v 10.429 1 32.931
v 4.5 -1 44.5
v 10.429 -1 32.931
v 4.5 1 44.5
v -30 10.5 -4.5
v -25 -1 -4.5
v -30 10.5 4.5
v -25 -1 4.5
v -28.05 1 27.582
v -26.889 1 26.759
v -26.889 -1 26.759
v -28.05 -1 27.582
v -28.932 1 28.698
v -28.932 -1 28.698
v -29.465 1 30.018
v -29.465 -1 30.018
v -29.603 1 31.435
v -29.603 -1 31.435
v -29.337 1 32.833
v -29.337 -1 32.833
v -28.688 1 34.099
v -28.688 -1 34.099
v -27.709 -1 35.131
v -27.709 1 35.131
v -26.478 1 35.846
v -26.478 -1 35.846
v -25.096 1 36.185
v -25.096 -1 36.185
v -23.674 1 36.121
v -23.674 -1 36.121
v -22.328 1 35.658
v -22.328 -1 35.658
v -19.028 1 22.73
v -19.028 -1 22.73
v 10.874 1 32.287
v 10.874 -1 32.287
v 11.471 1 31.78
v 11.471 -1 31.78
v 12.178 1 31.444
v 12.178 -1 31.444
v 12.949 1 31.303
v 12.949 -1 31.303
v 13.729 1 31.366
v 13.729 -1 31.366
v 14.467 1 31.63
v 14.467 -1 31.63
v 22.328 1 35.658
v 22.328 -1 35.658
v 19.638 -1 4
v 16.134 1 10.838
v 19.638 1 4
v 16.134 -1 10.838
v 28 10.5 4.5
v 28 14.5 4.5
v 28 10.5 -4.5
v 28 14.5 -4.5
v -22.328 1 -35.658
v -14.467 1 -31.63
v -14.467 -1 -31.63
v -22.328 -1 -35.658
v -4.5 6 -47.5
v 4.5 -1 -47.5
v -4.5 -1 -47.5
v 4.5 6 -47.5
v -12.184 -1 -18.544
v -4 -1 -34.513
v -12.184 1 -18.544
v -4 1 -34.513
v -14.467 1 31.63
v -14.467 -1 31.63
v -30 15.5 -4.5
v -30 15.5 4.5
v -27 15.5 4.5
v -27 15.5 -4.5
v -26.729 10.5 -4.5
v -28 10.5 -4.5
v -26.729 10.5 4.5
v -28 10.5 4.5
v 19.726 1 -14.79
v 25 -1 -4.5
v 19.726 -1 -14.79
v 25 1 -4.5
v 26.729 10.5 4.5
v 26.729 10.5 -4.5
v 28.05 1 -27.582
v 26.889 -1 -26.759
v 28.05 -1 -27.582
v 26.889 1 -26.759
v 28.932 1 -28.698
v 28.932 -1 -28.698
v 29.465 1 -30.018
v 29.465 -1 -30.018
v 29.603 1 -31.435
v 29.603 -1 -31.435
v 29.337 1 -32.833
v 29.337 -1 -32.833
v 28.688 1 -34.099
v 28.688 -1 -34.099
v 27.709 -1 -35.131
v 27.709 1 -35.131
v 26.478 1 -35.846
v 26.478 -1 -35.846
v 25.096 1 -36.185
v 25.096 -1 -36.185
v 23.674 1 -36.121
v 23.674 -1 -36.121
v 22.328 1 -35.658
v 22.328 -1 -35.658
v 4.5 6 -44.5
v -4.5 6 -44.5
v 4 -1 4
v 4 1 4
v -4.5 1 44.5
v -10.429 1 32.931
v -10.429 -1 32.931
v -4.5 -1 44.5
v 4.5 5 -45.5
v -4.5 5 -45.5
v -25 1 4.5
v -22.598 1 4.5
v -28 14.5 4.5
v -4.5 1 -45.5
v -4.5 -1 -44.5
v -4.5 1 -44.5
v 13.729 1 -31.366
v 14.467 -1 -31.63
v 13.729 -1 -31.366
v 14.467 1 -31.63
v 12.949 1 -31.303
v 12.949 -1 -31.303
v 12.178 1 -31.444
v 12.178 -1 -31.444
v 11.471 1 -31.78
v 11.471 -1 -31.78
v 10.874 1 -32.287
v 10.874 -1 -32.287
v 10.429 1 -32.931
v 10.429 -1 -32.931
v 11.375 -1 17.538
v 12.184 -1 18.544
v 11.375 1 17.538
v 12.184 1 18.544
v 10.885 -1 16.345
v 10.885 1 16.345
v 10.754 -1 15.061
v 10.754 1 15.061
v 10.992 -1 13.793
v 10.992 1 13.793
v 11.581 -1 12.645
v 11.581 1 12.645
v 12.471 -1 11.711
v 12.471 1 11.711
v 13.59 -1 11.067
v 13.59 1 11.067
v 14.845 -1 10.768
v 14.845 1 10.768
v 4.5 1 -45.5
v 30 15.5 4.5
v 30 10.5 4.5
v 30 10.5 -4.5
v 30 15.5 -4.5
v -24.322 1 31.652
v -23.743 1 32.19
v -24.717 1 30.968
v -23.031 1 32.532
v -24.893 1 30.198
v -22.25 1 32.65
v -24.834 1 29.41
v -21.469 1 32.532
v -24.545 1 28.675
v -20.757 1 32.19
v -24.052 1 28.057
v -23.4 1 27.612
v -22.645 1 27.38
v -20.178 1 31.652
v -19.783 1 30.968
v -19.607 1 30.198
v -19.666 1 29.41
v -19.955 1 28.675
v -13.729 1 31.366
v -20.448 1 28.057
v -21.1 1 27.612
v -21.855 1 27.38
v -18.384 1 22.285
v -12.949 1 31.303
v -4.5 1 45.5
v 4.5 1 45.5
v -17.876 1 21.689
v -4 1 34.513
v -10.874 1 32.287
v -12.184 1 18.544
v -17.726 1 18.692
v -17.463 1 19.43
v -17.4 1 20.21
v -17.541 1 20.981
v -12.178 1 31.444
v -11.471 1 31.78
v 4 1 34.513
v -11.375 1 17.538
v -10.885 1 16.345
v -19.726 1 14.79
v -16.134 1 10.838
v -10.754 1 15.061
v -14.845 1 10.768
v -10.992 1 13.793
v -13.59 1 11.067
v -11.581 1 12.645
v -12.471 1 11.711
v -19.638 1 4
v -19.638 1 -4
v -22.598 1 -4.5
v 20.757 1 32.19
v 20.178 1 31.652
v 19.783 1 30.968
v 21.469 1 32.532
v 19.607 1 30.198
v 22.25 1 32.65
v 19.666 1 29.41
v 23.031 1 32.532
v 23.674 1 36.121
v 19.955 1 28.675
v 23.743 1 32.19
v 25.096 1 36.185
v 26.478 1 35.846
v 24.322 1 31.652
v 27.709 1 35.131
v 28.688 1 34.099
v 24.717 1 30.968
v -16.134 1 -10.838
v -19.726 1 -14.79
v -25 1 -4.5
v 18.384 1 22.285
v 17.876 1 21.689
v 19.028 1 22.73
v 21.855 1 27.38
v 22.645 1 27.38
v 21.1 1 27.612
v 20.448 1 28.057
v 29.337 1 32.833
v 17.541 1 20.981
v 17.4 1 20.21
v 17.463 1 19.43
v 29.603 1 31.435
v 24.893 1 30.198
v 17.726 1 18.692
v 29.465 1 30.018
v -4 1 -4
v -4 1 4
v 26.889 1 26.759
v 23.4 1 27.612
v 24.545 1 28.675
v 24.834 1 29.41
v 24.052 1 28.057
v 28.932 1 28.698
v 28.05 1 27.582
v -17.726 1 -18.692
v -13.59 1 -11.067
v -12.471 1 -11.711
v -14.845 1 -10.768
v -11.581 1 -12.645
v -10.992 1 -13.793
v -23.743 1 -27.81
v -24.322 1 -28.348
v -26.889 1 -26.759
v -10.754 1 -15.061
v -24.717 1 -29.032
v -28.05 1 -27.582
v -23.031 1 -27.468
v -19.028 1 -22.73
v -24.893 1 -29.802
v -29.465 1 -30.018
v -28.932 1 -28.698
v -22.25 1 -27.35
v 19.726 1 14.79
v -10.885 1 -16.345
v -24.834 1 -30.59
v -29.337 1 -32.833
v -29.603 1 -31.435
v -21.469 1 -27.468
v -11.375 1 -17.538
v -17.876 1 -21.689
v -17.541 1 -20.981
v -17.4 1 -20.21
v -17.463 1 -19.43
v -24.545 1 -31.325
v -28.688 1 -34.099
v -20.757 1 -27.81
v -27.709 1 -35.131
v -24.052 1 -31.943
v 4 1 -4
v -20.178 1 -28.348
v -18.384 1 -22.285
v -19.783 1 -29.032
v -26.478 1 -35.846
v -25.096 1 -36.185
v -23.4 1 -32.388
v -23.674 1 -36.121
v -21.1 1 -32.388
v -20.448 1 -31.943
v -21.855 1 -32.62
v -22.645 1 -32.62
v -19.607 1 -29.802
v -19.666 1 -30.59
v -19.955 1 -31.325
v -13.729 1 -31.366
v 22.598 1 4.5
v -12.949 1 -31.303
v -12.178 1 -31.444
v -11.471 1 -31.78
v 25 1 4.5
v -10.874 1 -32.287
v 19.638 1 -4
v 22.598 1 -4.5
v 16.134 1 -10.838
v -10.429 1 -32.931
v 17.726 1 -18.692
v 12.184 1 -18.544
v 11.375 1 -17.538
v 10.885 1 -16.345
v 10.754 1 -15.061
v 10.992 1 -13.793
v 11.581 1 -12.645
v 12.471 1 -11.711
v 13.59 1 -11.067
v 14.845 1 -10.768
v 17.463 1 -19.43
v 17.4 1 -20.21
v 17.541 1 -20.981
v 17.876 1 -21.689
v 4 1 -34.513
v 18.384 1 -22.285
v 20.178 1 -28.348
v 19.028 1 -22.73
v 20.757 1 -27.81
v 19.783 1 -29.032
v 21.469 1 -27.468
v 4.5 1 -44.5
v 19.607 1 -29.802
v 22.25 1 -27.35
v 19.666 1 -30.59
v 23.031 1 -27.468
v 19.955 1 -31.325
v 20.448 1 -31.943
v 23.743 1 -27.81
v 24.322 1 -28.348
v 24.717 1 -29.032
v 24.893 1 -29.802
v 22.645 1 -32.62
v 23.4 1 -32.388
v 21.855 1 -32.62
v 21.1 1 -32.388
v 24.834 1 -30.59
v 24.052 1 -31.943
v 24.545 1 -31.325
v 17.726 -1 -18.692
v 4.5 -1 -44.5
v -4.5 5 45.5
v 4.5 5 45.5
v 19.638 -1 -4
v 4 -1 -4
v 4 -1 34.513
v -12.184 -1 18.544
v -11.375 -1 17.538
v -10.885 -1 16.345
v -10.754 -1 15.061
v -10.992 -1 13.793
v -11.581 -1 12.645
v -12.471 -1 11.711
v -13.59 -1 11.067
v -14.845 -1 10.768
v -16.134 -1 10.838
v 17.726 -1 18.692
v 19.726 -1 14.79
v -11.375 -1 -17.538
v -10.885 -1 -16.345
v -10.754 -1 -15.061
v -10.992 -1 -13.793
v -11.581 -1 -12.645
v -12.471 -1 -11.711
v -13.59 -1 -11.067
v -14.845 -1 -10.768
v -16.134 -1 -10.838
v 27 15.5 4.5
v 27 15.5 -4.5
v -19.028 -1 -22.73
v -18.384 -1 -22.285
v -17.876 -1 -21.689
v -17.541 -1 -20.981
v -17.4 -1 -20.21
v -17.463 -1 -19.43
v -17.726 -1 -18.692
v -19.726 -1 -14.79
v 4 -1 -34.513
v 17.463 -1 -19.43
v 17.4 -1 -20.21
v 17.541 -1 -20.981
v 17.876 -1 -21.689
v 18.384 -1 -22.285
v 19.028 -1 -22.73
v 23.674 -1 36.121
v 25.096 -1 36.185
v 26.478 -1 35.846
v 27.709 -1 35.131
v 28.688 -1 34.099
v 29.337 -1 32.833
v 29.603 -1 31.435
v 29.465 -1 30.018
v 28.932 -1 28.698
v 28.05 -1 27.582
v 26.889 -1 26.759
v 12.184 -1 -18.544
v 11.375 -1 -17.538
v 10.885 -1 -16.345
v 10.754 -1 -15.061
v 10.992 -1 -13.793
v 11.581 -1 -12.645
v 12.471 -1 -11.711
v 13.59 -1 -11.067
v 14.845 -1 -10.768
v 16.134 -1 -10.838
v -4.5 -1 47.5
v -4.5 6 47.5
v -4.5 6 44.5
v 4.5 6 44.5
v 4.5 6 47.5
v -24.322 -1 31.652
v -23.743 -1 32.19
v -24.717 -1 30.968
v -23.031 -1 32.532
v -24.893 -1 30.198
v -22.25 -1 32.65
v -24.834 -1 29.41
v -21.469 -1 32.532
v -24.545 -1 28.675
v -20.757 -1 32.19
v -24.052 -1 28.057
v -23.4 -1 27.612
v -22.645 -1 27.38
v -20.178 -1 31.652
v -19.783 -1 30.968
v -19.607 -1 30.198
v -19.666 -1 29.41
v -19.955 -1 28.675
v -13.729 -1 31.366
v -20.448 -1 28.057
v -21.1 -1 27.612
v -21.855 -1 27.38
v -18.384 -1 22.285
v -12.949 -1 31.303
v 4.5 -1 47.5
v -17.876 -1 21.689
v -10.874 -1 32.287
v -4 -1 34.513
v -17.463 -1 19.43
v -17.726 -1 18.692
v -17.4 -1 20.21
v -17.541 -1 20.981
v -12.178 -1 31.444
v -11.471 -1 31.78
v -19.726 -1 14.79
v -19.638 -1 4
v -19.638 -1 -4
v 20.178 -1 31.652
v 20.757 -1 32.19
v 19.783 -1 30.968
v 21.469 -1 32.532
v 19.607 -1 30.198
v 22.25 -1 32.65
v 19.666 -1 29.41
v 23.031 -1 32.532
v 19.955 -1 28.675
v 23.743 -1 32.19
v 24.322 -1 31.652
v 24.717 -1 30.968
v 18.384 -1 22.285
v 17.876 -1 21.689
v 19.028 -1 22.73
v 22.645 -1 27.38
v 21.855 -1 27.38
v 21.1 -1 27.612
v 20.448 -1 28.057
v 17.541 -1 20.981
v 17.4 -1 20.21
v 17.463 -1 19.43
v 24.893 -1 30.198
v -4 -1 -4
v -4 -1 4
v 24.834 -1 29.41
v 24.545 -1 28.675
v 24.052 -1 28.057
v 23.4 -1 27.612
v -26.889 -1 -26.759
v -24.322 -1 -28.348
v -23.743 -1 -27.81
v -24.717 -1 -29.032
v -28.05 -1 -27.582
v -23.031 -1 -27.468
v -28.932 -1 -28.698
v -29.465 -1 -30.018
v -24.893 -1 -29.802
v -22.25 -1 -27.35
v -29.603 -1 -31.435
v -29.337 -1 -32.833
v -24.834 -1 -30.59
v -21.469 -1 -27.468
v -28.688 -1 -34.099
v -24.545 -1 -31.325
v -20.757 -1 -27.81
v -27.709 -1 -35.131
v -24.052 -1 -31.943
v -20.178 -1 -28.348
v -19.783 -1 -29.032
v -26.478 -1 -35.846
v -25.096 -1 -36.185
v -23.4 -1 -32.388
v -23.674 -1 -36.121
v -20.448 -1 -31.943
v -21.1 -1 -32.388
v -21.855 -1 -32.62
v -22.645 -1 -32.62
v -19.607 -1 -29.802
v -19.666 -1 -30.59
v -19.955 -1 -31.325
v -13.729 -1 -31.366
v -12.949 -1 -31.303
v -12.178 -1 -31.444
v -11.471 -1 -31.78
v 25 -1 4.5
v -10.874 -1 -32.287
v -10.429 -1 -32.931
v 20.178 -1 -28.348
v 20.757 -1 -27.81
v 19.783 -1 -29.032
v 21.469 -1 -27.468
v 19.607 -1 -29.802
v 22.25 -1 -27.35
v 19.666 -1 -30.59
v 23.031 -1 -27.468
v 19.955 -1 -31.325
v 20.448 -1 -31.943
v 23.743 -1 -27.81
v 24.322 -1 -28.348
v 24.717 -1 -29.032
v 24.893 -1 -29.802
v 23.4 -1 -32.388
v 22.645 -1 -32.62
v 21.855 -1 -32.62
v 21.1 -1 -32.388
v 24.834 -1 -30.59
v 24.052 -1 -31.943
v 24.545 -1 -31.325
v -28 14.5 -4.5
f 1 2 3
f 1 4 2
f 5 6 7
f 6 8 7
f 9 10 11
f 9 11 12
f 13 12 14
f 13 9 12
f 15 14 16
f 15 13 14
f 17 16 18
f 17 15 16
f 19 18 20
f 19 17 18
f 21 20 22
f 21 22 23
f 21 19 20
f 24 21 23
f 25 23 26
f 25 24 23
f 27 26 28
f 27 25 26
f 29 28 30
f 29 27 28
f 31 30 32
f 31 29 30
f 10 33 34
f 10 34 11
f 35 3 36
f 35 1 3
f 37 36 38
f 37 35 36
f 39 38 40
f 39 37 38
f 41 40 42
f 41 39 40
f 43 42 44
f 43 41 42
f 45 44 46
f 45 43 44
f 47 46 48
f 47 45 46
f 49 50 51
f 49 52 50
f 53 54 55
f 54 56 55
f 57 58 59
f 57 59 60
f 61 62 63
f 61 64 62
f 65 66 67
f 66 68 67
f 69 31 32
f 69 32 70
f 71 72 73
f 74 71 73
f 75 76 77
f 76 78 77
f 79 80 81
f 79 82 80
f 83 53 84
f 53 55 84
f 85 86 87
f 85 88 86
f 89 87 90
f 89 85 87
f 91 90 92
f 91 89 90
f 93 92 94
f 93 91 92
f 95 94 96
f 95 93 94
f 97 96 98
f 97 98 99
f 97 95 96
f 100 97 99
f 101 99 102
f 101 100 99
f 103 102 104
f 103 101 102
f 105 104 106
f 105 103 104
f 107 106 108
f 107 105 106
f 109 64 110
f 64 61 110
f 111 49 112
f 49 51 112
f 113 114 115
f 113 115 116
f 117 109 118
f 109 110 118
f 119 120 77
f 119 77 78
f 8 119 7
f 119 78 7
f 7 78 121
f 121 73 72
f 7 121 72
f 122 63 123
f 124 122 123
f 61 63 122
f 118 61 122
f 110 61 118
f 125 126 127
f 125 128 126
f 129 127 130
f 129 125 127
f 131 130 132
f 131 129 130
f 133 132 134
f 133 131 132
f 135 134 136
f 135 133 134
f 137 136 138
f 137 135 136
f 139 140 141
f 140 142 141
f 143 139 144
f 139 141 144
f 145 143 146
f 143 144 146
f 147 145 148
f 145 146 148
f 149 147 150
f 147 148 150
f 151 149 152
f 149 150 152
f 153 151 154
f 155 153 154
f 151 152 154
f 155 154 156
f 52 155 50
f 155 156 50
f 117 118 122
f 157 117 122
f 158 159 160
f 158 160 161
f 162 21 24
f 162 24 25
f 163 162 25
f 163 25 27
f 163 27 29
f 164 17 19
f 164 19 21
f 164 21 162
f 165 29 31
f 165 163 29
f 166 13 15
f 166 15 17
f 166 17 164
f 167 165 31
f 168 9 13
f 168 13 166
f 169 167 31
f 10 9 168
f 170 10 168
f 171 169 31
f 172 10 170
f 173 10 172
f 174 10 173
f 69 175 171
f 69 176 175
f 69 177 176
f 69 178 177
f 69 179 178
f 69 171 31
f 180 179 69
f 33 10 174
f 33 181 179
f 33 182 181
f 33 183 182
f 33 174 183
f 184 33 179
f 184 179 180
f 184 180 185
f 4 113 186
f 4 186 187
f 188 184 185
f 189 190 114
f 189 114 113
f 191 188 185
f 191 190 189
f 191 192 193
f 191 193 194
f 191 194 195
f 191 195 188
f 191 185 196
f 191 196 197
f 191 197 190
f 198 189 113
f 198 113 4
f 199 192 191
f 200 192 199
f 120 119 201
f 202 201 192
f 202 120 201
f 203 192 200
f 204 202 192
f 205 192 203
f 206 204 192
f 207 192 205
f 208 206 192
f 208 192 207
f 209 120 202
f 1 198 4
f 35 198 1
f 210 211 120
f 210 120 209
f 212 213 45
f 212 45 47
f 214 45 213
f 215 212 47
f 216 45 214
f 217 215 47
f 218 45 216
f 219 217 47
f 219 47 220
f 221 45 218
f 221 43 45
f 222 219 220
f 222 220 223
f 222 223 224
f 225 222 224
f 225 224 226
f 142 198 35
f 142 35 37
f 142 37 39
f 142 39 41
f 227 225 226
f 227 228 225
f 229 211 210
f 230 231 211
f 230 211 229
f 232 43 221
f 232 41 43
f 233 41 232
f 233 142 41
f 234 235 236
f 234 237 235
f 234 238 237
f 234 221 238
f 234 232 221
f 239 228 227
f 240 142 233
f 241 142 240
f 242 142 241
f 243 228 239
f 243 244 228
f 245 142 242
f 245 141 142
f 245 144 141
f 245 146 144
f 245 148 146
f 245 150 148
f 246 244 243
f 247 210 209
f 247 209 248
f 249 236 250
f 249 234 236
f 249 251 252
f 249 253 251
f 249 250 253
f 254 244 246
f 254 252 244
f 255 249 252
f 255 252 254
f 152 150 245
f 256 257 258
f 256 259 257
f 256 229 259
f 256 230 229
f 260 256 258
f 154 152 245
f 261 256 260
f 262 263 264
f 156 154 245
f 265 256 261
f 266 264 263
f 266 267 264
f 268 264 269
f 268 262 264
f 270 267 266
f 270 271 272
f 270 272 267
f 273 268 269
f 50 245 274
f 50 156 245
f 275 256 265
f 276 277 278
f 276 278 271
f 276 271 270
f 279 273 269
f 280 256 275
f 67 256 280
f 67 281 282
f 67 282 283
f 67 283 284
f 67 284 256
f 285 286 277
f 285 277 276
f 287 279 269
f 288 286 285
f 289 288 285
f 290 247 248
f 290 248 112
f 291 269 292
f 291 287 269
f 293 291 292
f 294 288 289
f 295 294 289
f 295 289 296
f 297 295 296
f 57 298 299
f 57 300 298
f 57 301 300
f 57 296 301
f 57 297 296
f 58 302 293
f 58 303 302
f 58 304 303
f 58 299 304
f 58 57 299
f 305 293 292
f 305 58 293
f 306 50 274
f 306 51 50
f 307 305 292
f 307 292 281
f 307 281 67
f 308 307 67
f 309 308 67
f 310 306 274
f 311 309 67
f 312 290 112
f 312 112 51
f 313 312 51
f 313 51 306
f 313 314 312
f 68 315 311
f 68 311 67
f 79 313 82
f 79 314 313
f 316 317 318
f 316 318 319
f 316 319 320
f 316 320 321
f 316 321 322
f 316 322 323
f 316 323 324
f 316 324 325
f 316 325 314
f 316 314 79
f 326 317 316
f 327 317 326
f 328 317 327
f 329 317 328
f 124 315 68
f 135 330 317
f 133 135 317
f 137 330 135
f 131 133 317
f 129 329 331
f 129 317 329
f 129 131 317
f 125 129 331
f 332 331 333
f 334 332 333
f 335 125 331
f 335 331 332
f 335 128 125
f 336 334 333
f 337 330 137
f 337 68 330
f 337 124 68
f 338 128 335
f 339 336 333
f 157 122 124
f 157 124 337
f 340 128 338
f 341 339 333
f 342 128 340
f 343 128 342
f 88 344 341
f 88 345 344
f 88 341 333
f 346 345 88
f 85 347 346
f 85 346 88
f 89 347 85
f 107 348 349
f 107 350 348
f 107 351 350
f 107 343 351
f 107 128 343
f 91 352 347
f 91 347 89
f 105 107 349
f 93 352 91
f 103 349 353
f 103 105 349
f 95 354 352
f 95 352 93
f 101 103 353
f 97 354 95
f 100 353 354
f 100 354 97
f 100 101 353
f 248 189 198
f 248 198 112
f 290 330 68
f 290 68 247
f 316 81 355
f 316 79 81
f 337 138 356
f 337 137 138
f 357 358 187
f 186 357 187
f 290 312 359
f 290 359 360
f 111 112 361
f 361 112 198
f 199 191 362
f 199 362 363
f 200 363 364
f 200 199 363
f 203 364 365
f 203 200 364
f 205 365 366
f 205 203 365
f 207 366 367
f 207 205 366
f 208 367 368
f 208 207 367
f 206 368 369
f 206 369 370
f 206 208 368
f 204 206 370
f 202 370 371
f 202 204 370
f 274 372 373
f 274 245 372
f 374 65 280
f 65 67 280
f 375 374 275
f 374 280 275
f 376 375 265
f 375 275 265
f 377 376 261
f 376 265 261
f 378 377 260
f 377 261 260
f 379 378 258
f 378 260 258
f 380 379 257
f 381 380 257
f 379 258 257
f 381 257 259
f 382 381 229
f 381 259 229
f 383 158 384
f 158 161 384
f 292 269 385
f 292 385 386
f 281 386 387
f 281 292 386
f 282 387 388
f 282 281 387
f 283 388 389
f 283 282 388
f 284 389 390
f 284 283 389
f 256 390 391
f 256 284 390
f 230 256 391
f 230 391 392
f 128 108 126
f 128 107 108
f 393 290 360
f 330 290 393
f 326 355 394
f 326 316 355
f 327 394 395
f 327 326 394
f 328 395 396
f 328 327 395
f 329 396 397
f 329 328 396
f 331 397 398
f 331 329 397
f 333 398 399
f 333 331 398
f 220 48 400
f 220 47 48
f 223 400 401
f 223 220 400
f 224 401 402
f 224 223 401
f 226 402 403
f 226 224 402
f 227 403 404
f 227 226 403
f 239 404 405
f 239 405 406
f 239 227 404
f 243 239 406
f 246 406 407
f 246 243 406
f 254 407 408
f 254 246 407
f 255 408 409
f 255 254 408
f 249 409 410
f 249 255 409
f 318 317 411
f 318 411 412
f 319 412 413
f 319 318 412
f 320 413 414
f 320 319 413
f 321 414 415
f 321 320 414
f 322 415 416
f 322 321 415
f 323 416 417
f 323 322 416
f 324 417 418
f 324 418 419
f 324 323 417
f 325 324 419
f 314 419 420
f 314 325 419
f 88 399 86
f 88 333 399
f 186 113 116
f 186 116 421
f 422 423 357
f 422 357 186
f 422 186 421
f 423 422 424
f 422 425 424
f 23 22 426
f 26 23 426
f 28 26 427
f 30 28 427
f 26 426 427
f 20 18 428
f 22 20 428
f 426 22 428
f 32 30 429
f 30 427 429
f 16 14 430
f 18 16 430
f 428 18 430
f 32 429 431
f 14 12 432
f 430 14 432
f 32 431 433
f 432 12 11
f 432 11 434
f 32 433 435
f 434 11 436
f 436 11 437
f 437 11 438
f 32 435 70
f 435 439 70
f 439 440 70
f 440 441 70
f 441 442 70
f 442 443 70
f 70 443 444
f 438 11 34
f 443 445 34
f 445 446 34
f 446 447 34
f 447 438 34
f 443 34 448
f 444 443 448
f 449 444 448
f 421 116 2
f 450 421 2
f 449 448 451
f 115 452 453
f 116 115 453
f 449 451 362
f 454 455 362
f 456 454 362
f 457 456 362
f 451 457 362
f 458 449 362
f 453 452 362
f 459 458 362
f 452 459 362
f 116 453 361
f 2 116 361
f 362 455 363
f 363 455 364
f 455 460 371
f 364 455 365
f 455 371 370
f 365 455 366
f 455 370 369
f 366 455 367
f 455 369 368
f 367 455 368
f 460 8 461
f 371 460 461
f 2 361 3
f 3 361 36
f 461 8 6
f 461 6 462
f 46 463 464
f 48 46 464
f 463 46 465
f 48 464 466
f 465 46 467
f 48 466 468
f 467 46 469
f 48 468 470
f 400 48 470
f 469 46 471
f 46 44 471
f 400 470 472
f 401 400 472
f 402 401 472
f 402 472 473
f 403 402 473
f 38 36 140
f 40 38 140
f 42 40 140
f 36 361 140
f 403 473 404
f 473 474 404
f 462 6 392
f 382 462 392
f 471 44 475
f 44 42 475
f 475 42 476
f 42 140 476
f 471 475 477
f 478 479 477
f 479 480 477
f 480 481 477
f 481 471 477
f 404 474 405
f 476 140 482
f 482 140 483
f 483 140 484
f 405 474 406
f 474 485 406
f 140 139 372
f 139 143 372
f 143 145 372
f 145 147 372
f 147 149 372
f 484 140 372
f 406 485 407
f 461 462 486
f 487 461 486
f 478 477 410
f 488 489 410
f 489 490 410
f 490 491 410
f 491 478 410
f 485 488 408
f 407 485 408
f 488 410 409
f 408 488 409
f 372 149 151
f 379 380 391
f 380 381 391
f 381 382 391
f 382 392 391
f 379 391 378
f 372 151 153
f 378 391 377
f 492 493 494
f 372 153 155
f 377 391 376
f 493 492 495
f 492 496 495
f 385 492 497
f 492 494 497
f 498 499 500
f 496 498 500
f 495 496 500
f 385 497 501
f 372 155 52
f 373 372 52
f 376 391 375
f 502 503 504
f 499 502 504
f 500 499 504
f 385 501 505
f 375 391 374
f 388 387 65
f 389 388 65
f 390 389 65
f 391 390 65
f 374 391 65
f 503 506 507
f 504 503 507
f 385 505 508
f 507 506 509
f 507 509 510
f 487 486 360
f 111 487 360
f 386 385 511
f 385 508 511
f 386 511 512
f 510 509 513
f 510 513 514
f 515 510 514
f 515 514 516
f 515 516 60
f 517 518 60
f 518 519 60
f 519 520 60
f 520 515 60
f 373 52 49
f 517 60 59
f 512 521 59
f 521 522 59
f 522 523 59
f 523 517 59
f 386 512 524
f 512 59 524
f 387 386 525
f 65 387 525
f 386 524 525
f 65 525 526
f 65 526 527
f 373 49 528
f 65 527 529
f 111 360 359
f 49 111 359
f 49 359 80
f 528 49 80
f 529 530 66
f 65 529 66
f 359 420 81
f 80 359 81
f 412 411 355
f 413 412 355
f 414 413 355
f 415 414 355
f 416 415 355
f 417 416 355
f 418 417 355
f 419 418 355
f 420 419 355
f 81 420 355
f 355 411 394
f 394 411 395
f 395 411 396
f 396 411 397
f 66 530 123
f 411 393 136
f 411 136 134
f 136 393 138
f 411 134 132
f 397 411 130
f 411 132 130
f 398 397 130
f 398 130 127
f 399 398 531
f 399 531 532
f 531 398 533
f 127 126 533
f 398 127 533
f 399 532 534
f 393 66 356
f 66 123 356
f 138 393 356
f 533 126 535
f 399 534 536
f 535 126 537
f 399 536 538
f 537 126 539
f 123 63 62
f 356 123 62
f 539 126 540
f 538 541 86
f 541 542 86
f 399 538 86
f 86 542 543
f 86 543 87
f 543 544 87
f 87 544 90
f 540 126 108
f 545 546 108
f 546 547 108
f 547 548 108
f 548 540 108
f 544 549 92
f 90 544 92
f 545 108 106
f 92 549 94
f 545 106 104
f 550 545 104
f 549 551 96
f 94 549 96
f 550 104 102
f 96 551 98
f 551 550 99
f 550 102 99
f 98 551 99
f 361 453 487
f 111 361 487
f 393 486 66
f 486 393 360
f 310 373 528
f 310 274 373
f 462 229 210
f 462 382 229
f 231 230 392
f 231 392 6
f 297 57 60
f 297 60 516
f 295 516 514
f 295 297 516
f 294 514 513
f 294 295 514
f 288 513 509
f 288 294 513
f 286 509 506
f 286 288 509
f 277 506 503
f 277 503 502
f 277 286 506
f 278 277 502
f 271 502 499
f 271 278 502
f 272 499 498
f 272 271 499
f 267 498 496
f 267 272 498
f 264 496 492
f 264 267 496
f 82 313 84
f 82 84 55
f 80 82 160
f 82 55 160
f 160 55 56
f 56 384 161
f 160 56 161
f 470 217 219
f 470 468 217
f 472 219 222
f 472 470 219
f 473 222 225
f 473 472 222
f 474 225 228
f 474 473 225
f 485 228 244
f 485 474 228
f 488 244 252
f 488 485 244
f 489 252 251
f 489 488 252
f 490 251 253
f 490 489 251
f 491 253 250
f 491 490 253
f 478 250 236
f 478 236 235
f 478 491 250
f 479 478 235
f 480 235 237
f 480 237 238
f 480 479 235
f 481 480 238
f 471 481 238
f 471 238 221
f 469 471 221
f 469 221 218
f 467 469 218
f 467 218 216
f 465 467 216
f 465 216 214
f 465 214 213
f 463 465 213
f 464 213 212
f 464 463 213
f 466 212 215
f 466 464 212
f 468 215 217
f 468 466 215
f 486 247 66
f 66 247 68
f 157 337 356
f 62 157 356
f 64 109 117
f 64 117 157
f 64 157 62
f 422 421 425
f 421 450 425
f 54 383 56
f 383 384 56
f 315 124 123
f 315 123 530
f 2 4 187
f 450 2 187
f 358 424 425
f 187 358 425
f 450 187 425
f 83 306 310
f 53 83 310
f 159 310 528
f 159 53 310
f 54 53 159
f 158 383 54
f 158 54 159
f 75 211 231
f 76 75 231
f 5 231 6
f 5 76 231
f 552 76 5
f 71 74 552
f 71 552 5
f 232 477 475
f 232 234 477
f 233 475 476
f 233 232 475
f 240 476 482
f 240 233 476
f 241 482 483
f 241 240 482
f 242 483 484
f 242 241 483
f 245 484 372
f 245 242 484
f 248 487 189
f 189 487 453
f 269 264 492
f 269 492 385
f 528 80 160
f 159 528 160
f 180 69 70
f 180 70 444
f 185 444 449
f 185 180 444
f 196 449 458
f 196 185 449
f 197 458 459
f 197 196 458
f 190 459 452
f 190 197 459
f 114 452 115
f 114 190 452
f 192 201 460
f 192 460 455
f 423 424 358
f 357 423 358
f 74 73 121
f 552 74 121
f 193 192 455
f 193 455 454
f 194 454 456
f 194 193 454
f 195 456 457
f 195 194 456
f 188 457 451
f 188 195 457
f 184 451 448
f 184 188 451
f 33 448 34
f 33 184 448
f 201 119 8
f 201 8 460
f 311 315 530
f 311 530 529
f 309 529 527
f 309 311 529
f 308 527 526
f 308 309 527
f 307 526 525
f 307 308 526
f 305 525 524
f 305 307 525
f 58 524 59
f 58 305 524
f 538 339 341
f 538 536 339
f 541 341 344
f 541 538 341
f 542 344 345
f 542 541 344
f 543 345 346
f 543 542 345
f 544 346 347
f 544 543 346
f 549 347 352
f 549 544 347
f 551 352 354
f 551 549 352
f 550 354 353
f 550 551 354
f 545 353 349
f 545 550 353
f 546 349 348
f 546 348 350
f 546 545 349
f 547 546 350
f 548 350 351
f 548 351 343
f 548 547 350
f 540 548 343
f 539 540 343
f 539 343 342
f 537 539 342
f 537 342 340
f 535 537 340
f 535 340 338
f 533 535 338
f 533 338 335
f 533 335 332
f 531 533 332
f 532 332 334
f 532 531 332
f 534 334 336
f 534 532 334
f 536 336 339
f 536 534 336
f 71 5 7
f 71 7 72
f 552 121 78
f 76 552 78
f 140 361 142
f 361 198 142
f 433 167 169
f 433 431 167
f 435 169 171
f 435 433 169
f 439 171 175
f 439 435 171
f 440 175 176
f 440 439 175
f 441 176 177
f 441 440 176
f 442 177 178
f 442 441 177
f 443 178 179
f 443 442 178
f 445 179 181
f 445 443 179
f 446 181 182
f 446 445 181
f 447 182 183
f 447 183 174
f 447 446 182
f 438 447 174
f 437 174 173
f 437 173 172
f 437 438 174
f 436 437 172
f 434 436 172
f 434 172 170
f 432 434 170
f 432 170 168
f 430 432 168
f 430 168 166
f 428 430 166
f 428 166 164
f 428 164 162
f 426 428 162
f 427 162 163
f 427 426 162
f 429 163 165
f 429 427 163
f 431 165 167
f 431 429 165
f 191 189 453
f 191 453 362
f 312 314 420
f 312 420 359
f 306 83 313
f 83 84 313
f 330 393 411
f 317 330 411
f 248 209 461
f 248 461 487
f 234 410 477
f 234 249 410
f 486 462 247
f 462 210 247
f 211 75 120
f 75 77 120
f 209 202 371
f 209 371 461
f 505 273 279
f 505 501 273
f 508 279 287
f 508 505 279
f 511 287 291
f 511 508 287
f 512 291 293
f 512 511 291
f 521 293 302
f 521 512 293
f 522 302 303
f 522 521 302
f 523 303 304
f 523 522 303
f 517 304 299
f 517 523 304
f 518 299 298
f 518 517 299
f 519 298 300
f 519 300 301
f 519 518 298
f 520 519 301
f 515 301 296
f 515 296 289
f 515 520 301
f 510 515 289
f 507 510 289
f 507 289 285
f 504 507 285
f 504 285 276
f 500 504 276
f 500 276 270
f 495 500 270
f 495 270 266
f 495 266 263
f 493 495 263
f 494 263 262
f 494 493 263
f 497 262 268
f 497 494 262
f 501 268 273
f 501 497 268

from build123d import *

# Parameters (mm, degrees)
SKETCH1_R           = 2.65
BOSS_EXTRUDE1_DEPTH = 1
BOSS_EXTRUDE4_DEPTH = 4.5
BOSS_EXTRUDE5_DEPTH = 4.5


with BuildPart() as part:
    # Sketch1 → Boss-Extrude1 (new, symmetric)
    with BuildSketch(Plane(origin=(0, 0, 0), x_dir=(1, 0, 0), z_dir=(0, 1, 0))):
        with BuildLine():
            Line((4.5, 47.5), (-4.5, 47.5))
            Line((-4.5, 47.5), (-4.5, 44.5))
            Line((-4.5, 44.5), (-10.429017764, 32.931184851))
            ThreePointArc((-10.429017764, 32.931184851), (-12.17849868, 31.444109042), (-14.467089888, 31.629657472))
            Line((-14.467089888, 31.629657472), (-22.327869159, 35.658306849))
            ThreePointArc((-22.327869159, 35.658306849), (-29.057989367, 33.48909455), (-26.888777069, 26.758974343))
            Line((-26.888777069, 26.758974343), (-19.027997797, 22.730324967))
            ThreePointArc((-19.027997797, 22.730324967), (-17.540921988, 20.980844051), (-17.726470418, 18.692252842))
            Line((-17.726470418, 18.692252842), (-19.726418437, 14.789915246))
            Line((-19.726418437, 14.789915246), (-25, 4.5))
            Line((-25, 4.5), (-25, -4.5))
            Line((-25, -4.5), (-19.726418437, -14.789915246))
            Line((-19.726418437, -14.789915246), (-17.726470418, -18.692252842))
            ThreePointArc((-17.726470418, -18.692252842), (-17.540921988, -20.980844051), (-19.027997797, -22.730324967))
            Line((-19.027997797, -22.730324967), (-26.888777069, -26.758974343))
            ThreePointArc((-26.888777069, -26.758974343), (-29.057989367, -33.48909455), (-22.327869159, -35.658306849))
            Line((-22.327869159, -35.658306849), (-14.467089888, -31.629657472))
            ThreePointArc((-14.467089888, -31.629657472), (-12.17849868, -31.444109042), (-10.429017764, -32.931184851))
            Line((-10.429017764, -32.931184851), (-4.5, -44.5))
            Line((-4.5, -44.5), (-4.5, -47.5))
            Line((-4.5, -47.5), (4.5, -47.5))
            Line((4.5, -47.5), (4.5, -44.5))
            Line((4.5, -44.5), (10.429017764, -32.931184851))
            ThreePointArc((10.429017764, -32.931184851), (12.17849868, -31.444109042), (14.467089888, -31.629657472))
            Line((14.467089888, -31.629657472), (22.327869159, -35.658306849))
            ThreePointArc((22.327869159, -35.658306849), (29.057989367, -33.48909455), (26.888777069, -26.758974343))
            Line((26.888777069, -26.758974343), (19.027997797, -22.730324967))
            ThreePointArc((19.027997797, -22.730324967), (17.540921988, -20.980844051), (17.726470418, -18.692252842))
            Line((17.726470418, -18.692252842), (19.726418437, -14.789915246))
            Line((19.726418437, -14.789915246), (25, -4.5))
            Line((25, -4.5), (25, 4.5))
            Line((25, 4.5), (19.726418437, 14.789915246))
            Line((19.726418437, 14.789915246), (17.726470418, 18.692252842))
            ThreePointArc((17.726470418, 18.692252842), (17.540921988, 20.980844051), (19.027997797, 22.730324967))
            Line((19.027997797, 22.730324967), (26.888777069, 26.758974343))
            ThreePointArc((26.888777069, 26.758974343), (29.057989367, 33.48909455), (22.327869159, 35.658306849))
            Line((22.327869159, 35.658306849), (14.467089888, 31.629657472))
            ThreePointArc((14.467089888, 31.629657472), (12.17849868, 31.444109042), (10.429017764, 32.931184851))
            Line((10.429017764, 32.931184851), (4.5, 44.5))
            Line((4.5, 44.5), (4.5, 47.5))
        make_face()
        with Locations(Location((-22.25, 30, 0), (0, 0, 270))):
            Circle(SKETCH1_R, mode=Mode.SUBTRACT)
        with Locations(Location((-22.25, -30, 0), (0, 0, 270))):
            Circle(SKETCH1_R, mode=Mode.SUBTRACT)
        with Locations(Location((22.25, 30, 0), (0, 0, 270))):
            Circle(SKETCH1_R, mode=Mode.SUBTRACT)
        with Locations(Location((22.25, -30, 0), (0, 0, 270))):
            Circle(SKETCH1_R, mode=Mode.SUBTRACT)
        with BuildLine():
            Line((-4, 34.512880186), (-12.184076307, 18.543950806))
            ThreePointArc((-12.184076307, 18.543950806), (-11.245300372, 13.197591441), (-16.133581658, 10.837598902))
            Line((-16.133581658, 10.837598902), (-19.637851096, 4))
            Line((-19.637851096, 4), (-4, 4))
            Line((-4, 4), (-4, 34.512880186))
        make_face(mode=Mode.SUBTRACT)
        with BuildLine():
            Line((4, 4), (4, 34.512880186))
            Line((4, 34.512880186), (12.184076307, 18.543950806))
            ThreePointArc((12.184076307, 18.543950806), (11.245300372, 13.197591441), (16.133581658, 10.837598902))
            Line((16.133581658, 10.837598902), (19.637851096, 4))
            Line((19.637851096, 4), (4, 4))
        make_face(mode=Mode.SUBTRACT)
        with BuildLine():
            Line((4, -34.512880186), (12.184076307, -18.543950806))
            ThreePointArc((12.184076307, -18.543950806), (11.245300372, -13.197591441), (16.133581658, -10.837598902))
            Line((16.133581658, -10.837598902), (19.637851096, -4))
            Line((19.637851096, -4), (4, -4))
            Line((4, -4), (4, -34.512880186))
        make_face(mode=Mode.SUBTRACT)
        with BuildLine():
            Line((-4, -4), (-4, -34.512880186))
            Line((-4, -34.512880186), (-12.184076307, -18.543950806))
            ThreePointArc((-12.184076307, -18.543950806), (-11.245300372, -13.197591441), (-16.133581658, -10.837598902))
            Line((-16.133581658, -10.837598902), (-19.637851096, -4))
            Line((-19.637851096, -4), (-4, -4))
        make_face(mode=Mode.SUBTRACT)
    extrude(amount=BOSS_EXTRUDE1_DEPTH, both=True)

    # Sketch6 → Boss-Extrude4 (add, symmetric)
    with BuildSketch(Plane(origin=(0, 0, 0), x_dir=(0, 0, -1), z_dir=(1, 0, 0))):
        Polygon((47.5, 1), (47.5, 6), (44.5, 6), (45.5, 5), (45.5, 1), align=None)
        Polygon((-45.5, 1), (-47.5, 1), (-47.5, 6), (-44.5, 6), (-45.5, 5), align=None)
    extrude(amount=BOSS_EXTRUDE4_DEPTH, both=True)

    # Sketch4 → Boss-Extrude5 (add, symmetric)
    with BuildSketch(Plane.XY):
        Polygon((30, 10.5), (30, 15.5), (27, 15.5), (28, 14.5), (28, 10.5), (26.728712295, 10.5), (22.598277512, 1), (25, 1), (25, -1), align=None)
        Polygon((-28, 14.5), (-28, 10.5), (-26.728712295, 10.5), (-22.598277512, 1), (-25, 1), (-25, -1), (-30, 10.5), (-30, 15.5), (-27, 15.5), align=None)
    extrude(amount=BOSS_EXTRUDE5_DEPTH, both=True)


solid = part.part
